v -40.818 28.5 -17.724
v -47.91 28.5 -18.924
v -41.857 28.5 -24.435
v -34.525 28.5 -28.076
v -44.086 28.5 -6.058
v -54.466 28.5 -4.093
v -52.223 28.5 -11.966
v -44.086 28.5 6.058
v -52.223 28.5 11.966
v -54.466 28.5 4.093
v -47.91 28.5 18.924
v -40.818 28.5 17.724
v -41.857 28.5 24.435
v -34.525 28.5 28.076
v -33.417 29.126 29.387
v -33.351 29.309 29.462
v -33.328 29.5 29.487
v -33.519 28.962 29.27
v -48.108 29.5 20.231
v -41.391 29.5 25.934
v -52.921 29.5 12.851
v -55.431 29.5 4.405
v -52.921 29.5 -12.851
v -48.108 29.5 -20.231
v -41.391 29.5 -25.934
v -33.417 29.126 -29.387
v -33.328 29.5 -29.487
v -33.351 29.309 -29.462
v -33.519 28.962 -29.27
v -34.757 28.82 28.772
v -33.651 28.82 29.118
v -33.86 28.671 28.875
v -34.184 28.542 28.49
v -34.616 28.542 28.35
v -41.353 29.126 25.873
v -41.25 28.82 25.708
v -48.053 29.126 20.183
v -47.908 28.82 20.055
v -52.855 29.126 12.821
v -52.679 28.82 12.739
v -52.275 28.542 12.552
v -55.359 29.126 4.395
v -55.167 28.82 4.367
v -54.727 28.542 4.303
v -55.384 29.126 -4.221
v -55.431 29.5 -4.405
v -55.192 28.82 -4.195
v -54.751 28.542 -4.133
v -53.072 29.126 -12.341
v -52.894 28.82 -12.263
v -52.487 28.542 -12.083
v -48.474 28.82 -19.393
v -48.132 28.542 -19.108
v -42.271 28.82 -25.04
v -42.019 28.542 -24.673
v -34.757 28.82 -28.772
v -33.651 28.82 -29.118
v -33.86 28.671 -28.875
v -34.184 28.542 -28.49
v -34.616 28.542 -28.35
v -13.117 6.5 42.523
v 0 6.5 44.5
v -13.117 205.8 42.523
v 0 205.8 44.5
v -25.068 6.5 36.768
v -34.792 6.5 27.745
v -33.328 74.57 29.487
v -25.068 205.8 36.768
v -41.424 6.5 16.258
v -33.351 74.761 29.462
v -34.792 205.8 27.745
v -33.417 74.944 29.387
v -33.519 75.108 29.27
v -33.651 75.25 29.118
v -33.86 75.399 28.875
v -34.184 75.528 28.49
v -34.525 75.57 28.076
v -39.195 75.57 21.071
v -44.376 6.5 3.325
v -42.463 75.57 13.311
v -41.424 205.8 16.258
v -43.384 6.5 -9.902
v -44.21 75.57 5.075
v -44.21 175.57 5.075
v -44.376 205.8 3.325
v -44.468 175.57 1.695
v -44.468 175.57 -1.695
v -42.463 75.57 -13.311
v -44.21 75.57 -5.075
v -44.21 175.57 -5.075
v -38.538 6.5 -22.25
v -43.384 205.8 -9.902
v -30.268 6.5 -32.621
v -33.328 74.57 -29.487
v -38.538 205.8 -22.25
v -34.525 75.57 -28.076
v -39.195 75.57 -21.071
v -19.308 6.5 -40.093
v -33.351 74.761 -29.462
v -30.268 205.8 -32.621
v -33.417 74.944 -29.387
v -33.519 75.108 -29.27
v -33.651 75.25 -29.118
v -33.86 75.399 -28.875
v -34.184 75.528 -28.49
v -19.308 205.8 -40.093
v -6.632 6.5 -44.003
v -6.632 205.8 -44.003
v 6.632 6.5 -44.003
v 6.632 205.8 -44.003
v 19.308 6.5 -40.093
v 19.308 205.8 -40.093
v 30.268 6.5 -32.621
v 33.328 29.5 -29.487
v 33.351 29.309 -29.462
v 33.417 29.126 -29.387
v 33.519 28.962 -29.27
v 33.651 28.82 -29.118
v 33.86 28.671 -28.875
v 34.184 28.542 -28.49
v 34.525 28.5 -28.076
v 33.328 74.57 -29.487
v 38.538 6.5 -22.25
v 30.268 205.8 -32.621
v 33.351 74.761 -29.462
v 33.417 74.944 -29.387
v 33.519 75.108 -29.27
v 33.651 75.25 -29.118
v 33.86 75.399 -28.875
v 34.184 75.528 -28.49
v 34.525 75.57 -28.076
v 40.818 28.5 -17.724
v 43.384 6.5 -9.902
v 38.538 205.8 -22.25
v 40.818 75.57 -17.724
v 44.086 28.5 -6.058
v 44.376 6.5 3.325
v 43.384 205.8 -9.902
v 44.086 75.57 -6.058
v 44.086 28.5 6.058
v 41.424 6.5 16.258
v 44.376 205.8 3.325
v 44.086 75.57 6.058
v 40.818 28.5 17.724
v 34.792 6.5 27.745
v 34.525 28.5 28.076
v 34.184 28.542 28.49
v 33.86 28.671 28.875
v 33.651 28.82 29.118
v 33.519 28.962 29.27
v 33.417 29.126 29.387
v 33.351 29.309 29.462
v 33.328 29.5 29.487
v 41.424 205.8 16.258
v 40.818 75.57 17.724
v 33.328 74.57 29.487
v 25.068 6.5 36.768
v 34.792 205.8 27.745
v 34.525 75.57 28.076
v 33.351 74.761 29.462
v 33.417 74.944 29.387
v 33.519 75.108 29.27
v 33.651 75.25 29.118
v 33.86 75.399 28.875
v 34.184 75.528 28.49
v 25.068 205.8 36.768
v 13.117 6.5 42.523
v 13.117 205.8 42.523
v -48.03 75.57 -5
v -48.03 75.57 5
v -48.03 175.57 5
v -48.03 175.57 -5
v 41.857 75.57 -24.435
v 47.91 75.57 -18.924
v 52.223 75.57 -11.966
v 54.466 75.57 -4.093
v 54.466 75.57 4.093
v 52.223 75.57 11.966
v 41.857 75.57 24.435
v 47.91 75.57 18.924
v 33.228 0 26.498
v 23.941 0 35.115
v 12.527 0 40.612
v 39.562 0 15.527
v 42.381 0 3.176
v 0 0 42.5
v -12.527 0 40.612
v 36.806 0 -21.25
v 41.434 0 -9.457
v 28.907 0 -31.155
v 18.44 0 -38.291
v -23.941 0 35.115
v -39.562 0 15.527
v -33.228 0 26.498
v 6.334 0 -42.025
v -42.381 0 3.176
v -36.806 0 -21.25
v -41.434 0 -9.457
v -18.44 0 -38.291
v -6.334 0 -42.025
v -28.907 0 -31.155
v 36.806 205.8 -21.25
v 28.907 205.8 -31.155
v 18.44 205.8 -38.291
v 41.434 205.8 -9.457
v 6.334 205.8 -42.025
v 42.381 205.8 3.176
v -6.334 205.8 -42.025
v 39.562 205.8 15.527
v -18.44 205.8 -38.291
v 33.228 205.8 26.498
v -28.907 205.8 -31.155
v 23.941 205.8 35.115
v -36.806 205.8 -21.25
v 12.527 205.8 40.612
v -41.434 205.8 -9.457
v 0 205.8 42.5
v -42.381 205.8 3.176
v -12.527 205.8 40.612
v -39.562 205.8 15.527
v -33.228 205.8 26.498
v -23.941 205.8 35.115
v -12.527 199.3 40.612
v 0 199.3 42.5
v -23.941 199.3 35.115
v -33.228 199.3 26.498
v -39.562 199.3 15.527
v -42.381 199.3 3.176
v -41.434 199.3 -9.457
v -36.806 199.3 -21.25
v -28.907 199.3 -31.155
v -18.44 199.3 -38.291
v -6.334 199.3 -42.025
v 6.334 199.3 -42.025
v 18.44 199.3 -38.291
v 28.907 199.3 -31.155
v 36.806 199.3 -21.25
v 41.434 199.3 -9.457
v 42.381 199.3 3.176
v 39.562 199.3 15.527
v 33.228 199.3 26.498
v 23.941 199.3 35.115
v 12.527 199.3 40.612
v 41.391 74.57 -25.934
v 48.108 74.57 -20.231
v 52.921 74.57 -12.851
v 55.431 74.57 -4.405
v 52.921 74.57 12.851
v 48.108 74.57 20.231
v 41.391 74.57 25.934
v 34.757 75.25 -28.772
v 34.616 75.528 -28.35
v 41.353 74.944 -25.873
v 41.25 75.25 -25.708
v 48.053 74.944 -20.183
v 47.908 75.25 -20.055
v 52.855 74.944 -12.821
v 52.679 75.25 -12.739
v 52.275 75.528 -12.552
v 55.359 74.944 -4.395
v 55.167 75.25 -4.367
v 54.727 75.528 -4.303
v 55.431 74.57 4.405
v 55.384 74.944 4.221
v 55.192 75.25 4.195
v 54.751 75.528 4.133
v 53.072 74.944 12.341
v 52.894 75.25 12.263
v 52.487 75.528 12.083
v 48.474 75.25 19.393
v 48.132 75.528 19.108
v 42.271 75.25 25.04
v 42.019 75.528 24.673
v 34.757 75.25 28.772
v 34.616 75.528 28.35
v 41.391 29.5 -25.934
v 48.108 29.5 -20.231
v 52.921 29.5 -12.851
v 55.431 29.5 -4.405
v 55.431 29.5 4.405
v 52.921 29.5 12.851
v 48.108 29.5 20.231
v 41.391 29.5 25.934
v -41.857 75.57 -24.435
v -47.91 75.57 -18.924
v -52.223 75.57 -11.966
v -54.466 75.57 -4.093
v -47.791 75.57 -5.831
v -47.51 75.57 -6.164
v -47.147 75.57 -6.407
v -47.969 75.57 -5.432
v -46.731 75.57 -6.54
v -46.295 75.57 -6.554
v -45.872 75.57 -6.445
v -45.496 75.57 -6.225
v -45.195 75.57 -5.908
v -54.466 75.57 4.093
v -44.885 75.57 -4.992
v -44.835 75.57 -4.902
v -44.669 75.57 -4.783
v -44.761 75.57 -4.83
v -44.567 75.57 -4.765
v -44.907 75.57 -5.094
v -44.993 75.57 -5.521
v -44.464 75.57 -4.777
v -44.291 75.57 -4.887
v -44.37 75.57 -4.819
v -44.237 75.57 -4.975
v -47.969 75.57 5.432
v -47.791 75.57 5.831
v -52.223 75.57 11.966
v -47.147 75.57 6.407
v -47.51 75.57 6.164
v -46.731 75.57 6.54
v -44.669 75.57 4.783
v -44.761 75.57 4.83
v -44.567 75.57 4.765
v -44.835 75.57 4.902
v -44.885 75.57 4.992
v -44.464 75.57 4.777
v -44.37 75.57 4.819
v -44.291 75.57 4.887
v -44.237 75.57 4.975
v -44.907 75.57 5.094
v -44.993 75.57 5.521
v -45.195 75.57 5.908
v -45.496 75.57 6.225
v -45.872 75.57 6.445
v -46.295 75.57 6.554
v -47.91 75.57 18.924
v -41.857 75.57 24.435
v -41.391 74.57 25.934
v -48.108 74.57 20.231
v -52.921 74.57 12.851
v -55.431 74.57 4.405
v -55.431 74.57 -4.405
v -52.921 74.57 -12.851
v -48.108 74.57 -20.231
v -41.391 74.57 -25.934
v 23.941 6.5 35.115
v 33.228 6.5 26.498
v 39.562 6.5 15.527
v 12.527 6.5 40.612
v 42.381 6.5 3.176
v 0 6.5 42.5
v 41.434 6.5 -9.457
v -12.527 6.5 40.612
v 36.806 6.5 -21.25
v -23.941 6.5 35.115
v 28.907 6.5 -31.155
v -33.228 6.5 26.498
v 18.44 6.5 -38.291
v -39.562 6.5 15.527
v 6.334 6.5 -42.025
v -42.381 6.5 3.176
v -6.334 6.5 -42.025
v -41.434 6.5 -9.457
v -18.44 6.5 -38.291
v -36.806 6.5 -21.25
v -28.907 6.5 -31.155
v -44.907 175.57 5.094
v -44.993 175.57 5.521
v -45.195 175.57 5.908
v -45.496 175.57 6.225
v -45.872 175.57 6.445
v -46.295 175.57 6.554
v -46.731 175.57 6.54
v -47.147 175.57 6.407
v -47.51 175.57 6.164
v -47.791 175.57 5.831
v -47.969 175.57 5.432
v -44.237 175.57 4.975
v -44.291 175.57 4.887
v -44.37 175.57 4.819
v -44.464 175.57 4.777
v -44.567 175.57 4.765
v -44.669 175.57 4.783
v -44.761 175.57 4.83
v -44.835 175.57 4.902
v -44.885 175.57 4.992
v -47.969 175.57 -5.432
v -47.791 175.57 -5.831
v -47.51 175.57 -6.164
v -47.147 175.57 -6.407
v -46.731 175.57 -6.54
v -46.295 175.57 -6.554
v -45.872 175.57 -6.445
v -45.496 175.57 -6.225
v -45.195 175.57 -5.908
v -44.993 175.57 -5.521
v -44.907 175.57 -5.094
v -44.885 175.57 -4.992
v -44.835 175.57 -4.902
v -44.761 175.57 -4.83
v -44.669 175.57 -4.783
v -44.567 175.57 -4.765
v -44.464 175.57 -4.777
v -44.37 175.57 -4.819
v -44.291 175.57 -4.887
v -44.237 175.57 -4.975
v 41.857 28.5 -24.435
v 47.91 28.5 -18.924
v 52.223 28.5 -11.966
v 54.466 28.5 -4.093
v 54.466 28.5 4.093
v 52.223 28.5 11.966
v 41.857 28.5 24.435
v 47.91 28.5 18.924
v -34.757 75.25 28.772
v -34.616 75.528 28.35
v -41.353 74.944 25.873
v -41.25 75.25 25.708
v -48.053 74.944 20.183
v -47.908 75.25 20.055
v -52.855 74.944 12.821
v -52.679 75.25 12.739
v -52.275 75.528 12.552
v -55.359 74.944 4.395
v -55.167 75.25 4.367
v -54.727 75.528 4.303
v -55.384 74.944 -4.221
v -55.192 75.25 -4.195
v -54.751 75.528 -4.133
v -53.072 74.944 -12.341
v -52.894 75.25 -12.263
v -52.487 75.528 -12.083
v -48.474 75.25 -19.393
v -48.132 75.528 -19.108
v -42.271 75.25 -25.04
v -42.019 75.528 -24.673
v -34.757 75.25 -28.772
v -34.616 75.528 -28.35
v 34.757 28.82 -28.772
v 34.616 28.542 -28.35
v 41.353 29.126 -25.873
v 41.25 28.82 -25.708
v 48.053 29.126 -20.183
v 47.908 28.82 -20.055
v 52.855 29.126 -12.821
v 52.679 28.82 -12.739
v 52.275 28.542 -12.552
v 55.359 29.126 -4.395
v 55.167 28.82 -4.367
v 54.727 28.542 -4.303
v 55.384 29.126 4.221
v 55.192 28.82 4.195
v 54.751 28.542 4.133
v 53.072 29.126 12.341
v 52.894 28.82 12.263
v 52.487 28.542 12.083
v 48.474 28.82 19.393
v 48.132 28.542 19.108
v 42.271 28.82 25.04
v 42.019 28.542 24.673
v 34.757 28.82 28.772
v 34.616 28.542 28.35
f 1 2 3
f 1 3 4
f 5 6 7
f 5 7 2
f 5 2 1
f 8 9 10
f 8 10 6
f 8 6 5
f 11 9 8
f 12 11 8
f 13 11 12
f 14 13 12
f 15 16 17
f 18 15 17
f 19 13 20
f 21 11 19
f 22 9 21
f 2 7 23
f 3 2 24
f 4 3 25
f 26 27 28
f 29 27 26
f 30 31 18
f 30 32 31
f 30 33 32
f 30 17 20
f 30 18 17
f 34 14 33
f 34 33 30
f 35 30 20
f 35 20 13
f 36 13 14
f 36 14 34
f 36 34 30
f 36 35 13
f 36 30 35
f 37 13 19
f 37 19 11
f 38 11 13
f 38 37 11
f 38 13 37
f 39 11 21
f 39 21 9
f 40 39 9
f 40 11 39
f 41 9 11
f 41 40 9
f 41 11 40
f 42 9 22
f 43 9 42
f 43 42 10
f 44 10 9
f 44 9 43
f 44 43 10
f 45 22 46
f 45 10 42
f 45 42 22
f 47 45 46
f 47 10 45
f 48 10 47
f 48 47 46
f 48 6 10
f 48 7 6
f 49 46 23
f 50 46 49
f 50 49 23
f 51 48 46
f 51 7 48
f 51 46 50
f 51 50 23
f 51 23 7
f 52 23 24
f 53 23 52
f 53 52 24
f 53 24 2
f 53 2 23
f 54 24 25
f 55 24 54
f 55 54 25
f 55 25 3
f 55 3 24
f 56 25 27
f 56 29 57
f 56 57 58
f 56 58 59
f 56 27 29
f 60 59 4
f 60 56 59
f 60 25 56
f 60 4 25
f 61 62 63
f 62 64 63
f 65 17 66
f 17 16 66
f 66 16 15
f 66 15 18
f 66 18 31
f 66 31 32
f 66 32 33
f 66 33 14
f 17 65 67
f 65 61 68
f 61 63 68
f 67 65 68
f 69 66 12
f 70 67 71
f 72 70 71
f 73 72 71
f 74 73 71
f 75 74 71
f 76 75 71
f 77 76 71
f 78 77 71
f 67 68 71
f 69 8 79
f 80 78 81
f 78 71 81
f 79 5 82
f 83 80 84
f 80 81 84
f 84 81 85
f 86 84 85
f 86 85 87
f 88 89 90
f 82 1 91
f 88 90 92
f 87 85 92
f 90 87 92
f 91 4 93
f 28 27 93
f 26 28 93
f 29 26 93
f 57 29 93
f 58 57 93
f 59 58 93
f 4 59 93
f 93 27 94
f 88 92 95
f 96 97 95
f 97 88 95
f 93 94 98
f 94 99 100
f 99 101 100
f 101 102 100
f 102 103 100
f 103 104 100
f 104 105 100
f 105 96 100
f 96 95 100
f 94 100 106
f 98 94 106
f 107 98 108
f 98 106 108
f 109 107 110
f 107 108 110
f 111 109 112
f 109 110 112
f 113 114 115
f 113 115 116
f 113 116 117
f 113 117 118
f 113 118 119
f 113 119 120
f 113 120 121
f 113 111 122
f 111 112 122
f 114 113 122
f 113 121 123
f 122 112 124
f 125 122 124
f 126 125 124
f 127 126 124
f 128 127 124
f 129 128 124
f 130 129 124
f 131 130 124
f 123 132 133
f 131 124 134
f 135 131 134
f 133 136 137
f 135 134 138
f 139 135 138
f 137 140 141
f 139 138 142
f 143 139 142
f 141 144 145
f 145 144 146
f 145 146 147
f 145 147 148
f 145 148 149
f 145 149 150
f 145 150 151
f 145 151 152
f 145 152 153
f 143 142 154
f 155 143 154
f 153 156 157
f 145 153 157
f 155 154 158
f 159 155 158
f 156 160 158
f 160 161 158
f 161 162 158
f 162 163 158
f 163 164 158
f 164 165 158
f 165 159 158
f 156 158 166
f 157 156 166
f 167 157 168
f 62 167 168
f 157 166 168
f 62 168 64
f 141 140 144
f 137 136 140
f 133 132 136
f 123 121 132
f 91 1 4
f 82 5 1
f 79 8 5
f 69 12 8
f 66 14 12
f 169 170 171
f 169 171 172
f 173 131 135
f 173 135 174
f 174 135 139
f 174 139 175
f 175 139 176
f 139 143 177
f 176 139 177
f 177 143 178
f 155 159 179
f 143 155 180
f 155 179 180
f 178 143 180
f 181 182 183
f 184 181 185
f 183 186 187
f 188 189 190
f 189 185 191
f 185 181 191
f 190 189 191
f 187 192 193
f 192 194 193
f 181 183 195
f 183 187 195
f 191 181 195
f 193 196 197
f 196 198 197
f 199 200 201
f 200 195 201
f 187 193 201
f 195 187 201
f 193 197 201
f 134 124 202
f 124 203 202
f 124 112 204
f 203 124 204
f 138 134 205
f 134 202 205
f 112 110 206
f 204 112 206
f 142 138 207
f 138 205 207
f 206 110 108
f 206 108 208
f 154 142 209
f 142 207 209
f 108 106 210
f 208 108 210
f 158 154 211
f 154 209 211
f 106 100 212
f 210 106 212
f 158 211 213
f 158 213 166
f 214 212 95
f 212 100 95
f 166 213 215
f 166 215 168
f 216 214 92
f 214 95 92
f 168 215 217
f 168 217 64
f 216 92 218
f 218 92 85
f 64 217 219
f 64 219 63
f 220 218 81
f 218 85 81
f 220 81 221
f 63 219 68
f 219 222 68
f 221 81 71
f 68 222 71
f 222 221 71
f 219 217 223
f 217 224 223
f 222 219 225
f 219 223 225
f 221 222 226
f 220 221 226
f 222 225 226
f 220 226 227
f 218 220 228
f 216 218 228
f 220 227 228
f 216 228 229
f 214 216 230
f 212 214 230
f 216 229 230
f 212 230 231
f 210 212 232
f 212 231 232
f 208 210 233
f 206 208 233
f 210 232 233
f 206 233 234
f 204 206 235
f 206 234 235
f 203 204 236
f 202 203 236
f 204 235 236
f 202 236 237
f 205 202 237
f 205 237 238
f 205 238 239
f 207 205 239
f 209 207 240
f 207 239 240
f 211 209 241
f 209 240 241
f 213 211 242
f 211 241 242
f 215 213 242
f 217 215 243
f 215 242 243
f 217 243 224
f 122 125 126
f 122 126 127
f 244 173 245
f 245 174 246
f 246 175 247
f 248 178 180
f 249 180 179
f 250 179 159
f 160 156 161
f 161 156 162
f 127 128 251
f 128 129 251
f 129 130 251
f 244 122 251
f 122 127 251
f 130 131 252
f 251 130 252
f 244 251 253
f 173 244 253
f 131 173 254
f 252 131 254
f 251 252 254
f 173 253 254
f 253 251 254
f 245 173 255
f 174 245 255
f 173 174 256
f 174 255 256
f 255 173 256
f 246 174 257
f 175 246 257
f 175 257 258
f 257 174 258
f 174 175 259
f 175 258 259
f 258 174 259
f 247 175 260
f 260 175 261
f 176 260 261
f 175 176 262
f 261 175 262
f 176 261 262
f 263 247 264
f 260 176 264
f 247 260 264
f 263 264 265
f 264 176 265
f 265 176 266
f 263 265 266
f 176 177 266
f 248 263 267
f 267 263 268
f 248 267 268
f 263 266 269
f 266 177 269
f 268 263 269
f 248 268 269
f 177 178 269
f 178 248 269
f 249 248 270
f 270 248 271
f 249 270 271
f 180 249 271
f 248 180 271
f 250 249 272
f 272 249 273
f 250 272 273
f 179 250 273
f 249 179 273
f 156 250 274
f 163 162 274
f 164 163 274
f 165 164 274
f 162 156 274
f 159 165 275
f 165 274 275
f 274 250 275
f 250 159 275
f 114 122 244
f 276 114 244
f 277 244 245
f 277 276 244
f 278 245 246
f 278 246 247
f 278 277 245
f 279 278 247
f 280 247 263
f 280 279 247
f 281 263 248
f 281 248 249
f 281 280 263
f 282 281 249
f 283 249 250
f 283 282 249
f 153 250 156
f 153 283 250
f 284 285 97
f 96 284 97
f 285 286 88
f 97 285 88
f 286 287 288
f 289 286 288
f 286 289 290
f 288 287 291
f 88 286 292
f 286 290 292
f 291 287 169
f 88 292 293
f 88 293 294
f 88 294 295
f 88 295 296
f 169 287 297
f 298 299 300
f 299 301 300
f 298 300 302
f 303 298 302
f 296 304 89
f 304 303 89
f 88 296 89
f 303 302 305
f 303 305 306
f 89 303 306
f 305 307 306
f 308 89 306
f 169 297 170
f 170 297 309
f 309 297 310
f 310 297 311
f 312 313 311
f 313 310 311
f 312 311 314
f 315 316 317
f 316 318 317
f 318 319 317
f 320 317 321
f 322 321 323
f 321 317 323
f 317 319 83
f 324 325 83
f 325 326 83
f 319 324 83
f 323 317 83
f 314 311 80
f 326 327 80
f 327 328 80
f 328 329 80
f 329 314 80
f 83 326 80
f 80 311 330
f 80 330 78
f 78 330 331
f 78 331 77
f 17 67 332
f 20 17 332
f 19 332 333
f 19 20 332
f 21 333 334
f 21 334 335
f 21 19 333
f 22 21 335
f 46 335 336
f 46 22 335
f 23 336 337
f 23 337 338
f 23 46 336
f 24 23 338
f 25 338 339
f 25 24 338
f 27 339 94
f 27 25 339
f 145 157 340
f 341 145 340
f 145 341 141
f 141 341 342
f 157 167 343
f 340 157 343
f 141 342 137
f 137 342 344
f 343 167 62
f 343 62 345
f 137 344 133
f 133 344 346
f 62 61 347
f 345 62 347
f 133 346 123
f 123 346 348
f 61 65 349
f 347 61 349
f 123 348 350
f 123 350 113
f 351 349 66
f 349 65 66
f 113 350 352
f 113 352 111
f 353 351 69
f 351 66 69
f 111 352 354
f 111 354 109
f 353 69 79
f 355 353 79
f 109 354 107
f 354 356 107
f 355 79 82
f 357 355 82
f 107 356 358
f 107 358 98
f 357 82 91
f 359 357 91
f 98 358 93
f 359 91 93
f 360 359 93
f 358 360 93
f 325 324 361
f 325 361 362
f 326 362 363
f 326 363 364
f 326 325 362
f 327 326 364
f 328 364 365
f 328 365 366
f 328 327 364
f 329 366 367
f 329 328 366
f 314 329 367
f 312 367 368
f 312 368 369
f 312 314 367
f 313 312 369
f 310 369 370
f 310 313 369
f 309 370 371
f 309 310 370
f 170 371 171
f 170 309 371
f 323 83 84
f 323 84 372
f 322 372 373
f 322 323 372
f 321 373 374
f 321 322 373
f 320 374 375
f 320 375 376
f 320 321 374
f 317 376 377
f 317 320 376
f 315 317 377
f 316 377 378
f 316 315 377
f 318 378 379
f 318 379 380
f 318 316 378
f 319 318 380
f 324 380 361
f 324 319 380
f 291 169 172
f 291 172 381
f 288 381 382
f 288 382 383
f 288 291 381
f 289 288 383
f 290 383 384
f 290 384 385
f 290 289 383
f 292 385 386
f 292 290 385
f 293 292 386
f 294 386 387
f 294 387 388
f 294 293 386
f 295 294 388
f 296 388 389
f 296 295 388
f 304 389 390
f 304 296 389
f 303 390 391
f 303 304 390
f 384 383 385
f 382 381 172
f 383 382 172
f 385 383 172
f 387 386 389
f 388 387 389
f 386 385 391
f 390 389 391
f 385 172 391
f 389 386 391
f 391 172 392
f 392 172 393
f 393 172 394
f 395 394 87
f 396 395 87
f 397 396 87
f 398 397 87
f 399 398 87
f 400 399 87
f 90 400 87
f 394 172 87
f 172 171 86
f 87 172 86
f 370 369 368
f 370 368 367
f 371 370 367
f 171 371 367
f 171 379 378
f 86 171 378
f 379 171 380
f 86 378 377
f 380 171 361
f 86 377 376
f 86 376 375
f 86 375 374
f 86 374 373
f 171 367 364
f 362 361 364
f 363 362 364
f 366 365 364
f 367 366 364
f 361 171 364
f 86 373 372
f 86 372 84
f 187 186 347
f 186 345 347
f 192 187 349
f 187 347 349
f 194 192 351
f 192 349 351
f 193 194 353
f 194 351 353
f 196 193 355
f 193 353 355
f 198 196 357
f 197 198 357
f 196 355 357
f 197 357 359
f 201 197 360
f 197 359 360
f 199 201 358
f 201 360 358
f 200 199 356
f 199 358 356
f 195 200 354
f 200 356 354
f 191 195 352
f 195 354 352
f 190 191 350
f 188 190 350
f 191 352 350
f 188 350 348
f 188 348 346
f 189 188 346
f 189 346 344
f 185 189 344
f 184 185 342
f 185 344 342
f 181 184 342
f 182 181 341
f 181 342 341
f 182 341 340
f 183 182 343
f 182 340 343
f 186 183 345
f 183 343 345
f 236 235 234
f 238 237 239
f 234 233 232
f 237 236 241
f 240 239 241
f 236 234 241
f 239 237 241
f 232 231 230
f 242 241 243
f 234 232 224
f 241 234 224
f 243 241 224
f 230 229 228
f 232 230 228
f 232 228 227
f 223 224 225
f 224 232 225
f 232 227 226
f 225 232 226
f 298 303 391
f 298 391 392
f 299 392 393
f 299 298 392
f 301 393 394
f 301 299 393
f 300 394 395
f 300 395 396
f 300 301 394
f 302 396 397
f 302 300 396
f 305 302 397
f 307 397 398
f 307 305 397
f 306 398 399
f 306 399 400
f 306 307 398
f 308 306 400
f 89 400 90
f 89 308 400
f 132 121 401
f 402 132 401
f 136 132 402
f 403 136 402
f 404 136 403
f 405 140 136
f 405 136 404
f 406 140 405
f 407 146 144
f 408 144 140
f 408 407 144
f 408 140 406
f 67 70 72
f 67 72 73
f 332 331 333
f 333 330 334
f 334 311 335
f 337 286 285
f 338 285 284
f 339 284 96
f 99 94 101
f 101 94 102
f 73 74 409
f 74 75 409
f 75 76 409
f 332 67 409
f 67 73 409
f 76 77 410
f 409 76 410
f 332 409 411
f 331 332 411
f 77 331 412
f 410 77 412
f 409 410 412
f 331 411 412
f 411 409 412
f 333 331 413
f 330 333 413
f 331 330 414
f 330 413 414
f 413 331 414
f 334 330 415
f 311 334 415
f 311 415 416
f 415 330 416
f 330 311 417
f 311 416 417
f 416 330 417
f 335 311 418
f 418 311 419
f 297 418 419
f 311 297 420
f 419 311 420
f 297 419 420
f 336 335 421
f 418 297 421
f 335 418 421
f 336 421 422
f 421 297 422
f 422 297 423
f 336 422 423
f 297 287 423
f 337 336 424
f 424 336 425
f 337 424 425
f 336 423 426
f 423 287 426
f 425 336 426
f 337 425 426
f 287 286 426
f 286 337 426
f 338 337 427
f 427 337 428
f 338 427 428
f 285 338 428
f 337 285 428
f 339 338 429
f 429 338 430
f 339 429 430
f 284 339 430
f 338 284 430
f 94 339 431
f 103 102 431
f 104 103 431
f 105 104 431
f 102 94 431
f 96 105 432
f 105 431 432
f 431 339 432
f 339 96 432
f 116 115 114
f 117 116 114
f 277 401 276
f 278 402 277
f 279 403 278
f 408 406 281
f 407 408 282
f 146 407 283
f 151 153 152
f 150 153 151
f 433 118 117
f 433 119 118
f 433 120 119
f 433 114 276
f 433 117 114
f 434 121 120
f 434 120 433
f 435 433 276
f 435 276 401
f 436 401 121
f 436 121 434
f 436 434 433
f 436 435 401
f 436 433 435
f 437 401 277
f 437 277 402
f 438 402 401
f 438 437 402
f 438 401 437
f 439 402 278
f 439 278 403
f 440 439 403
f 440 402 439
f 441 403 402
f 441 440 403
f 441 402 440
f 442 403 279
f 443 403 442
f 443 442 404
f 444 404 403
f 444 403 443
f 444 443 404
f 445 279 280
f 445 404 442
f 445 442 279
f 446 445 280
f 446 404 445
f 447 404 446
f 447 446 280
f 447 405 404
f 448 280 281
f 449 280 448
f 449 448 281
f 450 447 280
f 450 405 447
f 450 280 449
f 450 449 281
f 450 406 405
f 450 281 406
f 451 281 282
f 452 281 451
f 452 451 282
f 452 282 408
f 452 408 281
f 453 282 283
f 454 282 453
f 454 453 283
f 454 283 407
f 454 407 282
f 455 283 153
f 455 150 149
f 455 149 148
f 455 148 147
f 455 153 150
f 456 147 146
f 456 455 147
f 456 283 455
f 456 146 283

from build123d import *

# Parameters (mm, degrees)
EXTRUDE1_DEPTH = 47.07
EXTRUDE2_START = 100
EXTRUDE2_DEPTH = 100
FILLET1_R      = 1


with BuildPart() as part:
    # Sketch1 → Revolve1 (revolve)
    with BuildSketch(Plane(origin=(0, 0, 0), x_dir=(0, 0, -1), z_dir=(1, 0, 0))):
        Polygon((0, 0), (-42.5, 0), (-42.5, 6.5), (-44.5, 6.5), (-44.5, 205.8), (-42.5, 205.8), (-42.5, 199.3), (0, 199.3), align=None)
    revolve(axis=Axis((0, 199.3, 0), (0, -1, 0)))

    # Sketch2 → Extrude1 (add)
    with BuildSketch(Plane.XZ.offset(-28.5)):
        with BuildLine():
            ThreePointArc((0, -17.430935144), (55.75, 0), (0, 17.430935144))
            ThreePointArc((0, 17.430935144), (-55.75, 0), (0, -17.430935144))
        make_face()
    extrude(amount=-EXTRUDE1_DEPTH)

    # Sketch3 → Extrude2 (add)
    with BuildSketch(Plane(origin=(0, 75.57, 0), x_dir=(-1, 0, 0), z_dir=(0, 1, 0)).offset(EXTRUDE2_START)):
        with BuildLine():
            Line((48.03, 5), (48.03, -5))
            ThreePointArc((48.03, -5), (46.51379262, -6.562299411), (44.906801727, -5.093543292))
            ThreePointArc((44.906801727, -5.093543292), (44.566947891, -4.764619749), (44.209712274, -5.074577876))
            ThreePointArc((44.209712274, -5.074577876), (44.5, 0), (44.209712274, 5.074577876))
            ThreePointArc((44.209712274, 5.074577876), (44.566947891, 4.764619749), (44.906801727, 5.093543292))
            ThreePointArc((44.906801727, 5.093543292), (46.51379262, 6.562299411), (48.03, 5))
        make_face()
    extrude(amount=-EXTRUDE2_DEPTH)

    # Fillet1
    fillet1_edges = [part.edges().sort_by_distance(p)[0] for p in [
        (55.75, 28.5, 0),
        (55.75, 75.57, 0),
        (-55.75, 28.5, 0),
        (-55.75, 75.57, 0),
    ]]
    fillet(fillet1_edges, radius=FILLET1_R)


solid = part.part
